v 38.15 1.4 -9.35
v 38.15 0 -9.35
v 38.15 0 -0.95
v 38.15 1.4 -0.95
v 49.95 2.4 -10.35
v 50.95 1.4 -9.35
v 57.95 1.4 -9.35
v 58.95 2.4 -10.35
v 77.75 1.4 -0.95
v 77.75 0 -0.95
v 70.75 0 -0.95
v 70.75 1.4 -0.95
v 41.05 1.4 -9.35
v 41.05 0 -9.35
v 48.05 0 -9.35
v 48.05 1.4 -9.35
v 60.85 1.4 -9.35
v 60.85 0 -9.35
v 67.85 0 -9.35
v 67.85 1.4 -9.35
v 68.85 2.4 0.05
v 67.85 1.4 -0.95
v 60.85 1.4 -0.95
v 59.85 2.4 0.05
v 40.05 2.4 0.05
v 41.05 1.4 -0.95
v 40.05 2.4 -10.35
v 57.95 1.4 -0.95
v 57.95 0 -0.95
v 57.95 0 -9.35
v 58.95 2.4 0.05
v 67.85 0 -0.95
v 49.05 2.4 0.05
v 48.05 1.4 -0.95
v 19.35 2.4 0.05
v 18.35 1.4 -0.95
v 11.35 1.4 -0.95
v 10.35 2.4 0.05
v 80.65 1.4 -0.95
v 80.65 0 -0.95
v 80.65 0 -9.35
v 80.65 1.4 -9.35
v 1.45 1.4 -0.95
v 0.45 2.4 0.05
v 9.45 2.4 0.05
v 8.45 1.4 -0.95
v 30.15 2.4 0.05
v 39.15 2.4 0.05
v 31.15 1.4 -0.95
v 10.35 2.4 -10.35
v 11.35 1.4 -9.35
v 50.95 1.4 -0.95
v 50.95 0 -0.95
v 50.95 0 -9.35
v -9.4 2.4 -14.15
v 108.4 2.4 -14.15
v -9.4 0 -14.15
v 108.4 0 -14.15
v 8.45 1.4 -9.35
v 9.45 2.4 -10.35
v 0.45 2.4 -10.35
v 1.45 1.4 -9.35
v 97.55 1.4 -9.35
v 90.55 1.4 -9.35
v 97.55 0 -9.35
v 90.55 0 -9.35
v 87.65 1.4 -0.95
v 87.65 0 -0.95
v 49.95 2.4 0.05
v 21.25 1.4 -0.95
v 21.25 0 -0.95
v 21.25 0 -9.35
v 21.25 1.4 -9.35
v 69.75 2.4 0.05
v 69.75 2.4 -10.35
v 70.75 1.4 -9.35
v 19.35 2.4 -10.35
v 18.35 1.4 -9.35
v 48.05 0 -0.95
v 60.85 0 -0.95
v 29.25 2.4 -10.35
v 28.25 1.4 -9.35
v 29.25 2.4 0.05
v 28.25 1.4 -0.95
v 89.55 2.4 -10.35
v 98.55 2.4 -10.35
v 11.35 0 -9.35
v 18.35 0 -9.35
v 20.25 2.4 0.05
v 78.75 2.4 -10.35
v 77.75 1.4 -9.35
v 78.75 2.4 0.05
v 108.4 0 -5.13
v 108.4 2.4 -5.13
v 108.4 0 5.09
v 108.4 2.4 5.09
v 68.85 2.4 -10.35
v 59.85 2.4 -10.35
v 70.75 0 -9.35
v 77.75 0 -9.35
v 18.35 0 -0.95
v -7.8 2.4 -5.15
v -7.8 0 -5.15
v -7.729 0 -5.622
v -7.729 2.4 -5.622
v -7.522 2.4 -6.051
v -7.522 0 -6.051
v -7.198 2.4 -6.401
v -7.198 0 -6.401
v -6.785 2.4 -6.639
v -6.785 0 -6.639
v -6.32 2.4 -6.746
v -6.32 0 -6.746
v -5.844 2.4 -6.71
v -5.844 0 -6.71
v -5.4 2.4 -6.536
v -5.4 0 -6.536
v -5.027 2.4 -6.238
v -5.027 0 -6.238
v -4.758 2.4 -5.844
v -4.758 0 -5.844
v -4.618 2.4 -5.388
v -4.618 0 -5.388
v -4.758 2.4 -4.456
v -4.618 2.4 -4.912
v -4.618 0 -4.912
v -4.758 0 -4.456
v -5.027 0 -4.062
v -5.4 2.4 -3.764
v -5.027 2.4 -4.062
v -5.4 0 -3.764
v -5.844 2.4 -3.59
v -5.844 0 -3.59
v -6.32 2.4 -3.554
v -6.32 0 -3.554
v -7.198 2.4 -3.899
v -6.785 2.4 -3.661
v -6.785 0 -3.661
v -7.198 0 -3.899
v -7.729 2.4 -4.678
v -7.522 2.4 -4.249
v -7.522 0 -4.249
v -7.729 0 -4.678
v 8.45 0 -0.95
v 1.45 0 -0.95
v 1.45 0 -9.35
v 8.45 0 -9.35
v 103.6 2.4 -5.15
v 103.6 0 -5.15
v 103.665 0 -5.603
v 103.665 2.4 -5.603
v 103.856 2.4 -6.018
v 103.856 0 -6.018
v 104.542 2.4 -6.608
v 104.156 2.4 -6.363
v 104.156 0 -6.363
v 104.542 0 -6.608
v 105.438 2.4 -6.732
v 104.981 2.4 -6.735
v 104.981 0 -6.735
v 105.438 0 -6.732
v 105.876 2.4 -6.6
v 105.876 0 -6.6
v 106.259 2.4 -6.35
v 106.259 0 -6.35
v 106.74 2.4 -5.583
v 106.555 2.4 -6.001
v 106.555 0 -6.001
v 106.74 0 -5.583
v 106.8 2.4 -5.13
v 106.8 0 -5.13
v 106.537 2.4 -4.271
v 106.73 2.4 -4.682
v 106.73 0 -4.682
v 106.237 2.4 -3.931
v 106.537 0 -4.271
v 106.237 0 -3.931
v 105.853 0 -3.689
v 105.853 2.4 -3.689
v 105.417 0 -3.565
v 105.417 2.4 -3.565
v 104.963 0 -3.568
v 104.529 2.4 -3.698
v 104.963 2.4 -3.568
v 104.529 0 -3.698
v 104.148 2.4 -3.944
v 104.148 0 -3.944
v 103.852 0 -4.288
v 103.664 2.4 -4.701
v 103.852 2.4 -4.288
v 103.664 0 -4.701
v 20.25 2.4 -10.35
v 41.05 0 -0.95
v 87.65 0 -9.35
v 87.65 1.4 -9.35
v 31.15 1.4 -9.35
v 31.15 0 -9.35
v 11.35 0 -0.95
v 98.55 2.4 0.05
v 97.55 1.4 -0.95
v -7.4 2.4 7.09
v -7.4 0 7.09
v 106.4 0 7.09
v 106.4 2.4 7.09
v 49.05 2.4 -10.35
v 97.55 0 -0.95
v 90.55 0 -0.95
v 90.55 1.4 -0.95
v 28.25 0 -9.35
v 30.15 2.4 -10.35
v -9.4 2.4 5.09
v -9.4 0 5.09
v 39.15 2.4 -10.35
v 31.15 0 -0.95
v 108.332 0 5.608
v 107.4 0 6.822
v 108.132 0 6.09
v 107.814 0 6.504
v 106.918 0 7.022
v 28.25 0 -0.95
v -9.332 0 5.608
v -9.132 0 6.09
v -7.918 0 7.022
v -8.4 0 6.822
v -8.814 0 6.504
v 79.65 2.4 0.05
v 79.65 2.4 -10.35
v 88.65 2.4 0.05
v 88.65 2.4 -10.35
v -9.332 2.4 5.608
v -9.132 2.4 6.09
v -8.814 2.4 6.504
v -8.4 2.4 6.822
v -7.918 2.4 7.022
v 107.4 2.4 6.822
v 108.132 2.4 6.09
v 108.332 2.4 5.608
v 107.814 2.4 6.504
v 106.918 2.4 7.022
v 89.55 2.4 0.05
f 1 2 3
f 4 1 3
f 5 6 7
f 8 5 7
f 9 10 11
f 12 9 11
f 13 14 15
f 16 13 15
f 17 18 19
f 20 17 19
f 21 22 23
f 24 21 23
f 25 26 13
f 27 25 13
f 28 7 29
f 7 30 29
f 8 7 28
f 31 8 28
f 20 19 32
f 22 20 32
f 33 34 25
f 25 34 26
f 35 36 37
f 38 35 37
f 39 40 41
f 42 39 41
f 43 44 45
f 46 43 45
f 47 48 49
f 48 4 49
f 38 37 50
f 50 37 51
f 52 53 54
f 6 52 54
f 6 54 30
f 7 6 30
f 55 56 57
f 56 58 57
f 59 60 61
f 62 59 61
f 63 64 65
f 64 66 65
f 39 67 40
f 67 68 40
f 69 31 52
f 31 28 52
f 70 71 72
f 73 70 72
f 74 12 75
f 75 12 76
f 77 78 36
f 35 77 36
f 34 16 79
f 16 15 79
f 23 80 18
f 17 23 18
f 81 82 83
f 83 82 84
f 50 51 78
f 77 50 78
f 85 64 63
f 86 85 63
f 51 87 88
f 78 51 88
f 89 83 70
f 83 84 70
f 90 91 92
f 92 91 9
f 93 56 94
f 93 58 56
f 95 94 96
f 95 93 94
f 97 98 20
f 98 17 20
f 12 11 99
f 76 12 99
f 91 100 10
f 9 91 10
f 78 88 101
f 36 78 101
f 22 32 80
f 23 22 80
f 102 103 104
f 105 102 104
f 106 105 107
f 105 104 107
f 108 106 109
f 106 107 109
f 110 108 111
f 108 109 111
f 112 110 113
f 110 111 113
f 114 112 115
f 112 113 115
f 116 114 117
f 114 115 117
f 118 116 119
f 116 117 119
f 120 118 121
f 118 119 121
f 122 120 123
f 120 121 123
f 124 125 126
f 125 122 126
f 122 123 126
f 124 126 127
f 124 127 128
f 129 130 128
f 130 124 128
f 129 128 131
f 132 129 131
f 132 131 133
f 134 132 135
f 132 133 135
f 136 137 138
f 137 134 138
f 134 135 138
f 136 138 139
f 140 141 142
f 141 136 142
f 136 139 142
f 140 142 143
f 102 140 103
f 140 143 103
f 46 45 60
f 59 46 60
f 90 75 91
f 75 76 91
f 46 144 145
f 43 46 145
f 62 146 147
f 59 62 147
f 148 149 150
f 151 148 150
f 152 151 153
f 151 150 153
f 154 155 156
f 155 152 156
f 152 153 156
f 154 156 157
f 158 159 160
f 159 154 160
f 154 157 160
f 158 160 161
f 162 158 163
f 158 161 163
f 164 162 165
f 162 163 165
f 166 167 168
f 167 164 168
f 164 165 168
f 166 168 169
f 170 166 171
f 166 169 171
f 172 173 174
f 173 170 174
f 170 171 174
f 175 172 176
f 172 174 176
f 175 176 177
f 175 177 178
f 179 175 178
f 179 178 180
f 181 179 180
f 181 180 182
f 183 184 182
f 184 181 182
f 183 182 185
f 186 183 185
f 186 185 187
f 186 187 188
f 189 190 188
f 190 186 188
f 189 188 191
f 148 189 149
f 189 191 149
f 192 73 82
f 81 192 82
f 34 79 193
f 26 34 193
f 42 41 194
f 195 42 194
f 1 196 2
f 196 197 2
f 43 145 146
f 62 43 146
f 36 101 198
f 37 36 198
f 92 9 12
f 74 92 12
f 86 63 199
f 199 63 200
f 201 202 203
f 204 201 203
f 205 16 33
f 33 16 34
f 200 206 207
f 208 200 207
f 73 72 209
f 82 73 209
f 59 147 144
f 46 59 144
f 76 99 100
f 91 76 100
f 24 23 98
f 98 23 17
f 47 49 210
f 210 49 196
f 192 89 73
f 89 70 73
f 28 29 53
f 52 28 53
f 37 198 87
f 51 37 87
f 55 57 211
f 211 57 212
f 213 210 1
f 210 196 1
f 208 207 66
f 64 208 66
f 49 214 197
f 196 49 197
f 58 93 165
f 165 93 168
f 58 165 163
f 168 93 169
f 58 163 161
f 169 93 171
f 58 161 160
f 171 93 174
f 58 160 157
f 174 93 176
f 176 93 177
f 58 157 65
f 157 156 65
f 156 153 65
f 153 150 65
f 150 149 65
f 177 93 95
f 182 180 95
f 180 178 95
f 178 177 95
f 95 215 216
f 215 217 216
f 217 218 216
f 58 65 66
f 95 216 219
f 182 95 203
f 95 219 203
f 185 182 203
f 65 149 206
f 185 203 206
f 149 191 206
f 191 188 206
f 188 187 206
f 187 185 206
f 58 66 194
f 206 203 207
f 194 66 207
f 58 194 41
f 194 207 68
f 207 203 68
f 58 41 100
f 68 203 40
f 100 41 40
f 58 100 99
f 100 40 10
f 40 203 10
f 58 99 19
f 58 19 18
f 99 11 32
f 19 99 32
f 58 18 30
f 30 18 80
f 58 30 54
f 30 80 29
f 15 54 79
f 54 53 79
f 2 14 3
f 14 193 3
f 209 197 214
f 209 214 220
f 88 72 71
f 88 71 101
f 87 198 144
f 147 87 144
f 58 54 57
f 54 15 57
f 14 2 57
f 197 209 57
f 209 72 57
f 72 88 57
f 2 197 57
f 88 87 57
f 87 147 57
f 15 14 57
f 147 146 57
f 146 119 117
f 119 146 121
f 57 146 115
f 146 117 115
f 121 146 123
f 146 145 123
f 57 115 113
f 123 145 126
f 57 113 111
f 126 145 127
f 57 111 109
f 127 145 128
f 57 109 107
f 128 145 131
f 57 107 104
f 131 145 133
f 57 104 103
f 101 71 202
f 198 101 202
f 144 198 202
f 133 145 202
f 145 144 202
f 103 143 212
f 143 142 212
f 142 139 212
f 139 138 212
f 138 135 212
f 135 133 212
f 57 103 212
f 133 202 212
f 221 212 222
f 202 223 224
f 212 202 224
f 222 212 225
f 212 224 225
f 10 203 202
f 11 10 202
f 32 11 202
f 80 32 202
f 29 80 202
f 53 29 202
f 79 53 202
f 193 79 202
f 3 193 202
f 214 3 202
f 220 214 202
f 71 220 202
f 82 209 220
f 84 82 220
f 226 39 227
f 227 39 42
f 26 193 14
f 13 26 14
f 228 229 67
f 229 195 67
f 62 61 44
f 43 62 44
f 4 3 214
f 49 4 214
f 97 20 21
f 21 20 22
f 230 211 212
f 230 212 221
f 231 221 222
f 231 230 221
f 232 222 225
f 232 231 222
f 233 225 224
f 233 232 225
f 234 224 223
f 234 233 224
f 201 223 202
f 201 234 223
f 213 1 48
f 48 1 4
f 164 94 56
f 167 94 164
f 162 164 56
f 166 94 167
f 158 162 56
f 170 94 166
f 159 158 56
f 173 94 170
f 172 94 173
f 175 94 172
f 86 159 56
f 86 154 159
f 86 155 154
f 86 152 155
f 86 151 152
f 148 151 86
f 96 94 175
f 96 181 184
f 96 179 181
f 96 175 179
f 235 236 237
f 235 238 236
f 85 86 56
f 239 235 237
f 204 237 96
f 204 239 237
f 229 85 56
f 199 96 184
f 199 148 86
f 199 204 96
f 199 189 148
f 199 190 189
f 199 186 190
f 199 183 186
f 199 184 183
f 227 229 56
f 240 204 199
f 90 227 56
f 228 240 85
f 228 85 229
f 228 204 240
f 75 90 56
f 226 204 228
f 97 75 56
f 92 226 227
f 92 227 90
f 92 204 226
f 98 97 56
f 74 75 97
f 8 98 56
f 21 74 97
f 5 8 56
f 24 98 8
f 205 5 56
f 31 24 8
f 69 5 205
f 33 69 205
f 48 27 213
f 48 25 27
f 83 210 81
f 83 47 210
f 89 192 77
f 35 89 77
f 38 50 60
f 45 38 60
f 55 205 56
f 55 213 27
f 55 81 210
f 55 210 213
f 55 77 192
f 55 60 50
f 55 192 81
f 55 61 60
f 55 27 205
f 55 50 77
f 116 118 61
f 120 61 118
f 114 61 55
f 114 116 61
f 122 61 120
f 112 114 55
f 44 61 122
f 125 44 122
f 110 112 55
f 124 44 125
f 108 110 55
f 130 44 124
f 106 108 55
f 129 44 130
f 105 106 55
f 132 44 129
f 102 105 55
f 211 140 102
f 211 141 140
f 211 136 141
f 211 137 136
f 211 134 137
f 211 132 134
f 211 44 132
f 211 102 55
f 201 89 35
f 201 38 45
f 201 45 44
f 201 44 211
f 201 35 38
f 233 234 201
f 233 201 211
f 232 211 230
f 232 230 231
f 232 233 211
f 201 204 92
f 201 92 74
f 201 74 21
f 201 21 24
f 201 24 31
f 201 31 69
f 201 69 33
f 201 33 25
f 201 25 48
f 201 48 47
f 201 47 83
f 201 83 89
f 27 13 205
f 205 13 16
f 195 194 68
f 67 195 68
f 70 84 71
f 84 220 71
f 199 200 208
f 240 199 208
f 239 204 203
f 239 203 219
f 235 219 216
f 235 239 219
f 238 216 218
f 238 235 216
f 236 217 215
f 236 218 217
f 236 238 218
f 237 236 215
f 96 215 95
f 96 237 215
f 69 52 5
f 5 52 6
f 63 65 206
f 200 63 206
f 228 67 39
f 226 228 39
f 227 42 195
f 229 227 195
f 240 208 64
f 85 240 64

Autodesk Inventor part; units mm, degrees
ref_plane "YZ Plane" through (0, 0, 0) normal (1, 0, 0) x (0, 1, 0)
ref_plane "XZ Plane" through (0, 0, 0) normal (0, 1, 0) x (-1, 0, 0)
ref_plane "XY Plane" through (0, 0, 0) normal (0, 0, 1) x (1, 0, 0)
sketch "Sketch1" plane through (0, 0, 0) normal (0, 1, 0) x (-1, 0, 0)
  line L0 (0, 0) -> (-9.9, 0)
  line L1 (0, 0) -> (0, -10.3)
  line L2 (0, -10.3) -> (-9.9, -10.3)
  line L3 (-9.9, -10.3) -> (-9.9, 0)
  line L4 (-9.9, -10.3) -> (-9.4, -10.3)
  line L5 (-9.4, -10.3) -> (-9.4, 0)
  line L6 (0, -10.3) -> (-0.5, -10.3)
  line L7 (-0.5, -10.3) -> (-0.5, 0)
  line L8 (-0.5, 0.85) -> (-9.9, 0.85)
  line L9 (-9.9, 0.85) -> (-9.9, 0)
  line L10 (0, 0) -> (0, 0.85)
  line L11 (0, 0.85) -> (-0.5, 0.85)
  line L12 (0, -10.3) -> (0, -11.15)
  line L13 (0, -11.15) -> (-9.9, -11.15)
  line L14 (-9.9, -11.15) -> (-9.9, -10.3)
  line L15 (-9.9, -11.15) -> (-19.8, -11.15)
  line L16 (-19.8, -11.15) -> (-19.8, -10.3)
  line L17 (-19.8, -10.3) -> (-19.8, 0)
  line L18 (-19.3, -10.3) -> (-19.3, 0)
  line L19 (-9.9, -10.3) -> (-19.8, -10.3)
  line L20 (-10.4, -10.3) -> (-10.4, 0)
  line L21 (-9.9, 0) -> (-9.9, -10.3)
  line L22 (-9.9, 0) -> (-9.9, 0.85)
  line L23 (-9.9, 0.85) -> (-10.4, 0.85)
  line L24 (-10.4, 0.85) -> (-19.8, 0.85)
  line L25 (-9.9, 0) -> (-19.8, 0)
  line L26 (-19.8, 0.85) -> (-19.8, 0)
  line L27 (-19.8, -11.15) -> (-29.7, -11.15)
  line L28 (-29.7, -11.15) -> (-29.7, -10.3)
  line L29 (-29.7, -10.3) -> (-29.7, 0)
  line L30 (-29.2, -10.3) -> (-29.2, 0)
  line L31 (-19.8, -10.3) -> (-29.7, -10.3)
  line L32 (-20.3, -10.3) -> (-20.3, 0)
  line L33 (-19.8, 0) -> (-19.8, -10.3)
  line L34 (-19.8, 0) -> (-19.8, 0.85)
  line L35 (-19.8, 0.85) -> (-20.3, 0.85)
  line L36 (-20.3, 0.85) -> (-29.7, 0.85)
  line L37 (-19.8, 0) -> (-29.7, 0)
  line L38 (-29.7, 0.85) -> (-29.7, 0)
  line L39 (-29.7, -11.15) -> (-39.6, -11.15)
  line L40 (-39.6, -11.15) -> (-39.6, -10.3)
  line L41 (-39.6, -10.3) -> (-39.6, 0)
  line L42 (-39.1, -10.3) -> (-39.1, 0)
  line L43 (-29.7, -10.3) -> (-39.6, -10.3)
  line L44 (-30.2, -10.3) -> (-30.2, 0)
  line L45 (-29.7, 0) -> (-29.7, -10.3)
  line L46 (-29.7, 0) -> (-29.7, 0.85)
  line L47 (-29.7, 0.85) -> (-30.2, 0.85)
  line L48 (-30.2, 0.85) -> (-39.6, 0.85)
  line L49 (-29.7, 0) -> (-39.6, 0)
  line L50 (-39.6, 0.85) -> (-39.6, 0)
  line L51 (-39.6, -11.15) -> (-49.5, -11.15)
  line L52 (-49.5, -11.15) -> (-49.5, -10.3)
  line L53 (-49.5, -10.3) -> (-49.5, 0)
  line L54 (-49, -10.3) -> (-49, 0)
  line L55 (-39.6, -10.3) -> (-49.5, -10.3)
  line L56 (-40.1, -10.3) -> (-40.1, 0)
  line L57 (-39.6, 0) -> (-39.6, -10.3)
  line L58 (-39.6, 0) -> (-39.6, 0.85)
  line L59 (-39.6, 0.85) -> (-40.1, 0.85)
  line L60 (-40.1, 0.85) -> (-49.5, 0.85)
  line L61 (-39.6, 0) -> (-49.5, 0)
  line L62 (-49.5, 0.85) -> (-49.5, 0)
  line L63 (-49.5, -11.15) -> (-59.4, -11.15)
  line L64 (-59.4, -11.15) -> (-59.4, -10.3)
  line L65 (-59.4, -10.3) -> (-59.4, 0)
  line L66 (-58.9, -10.3) -> (-58.9, 0)
  line L67 (-49.5, -10.3) -> (-59.4, -10.3)
  line L68 (-50, -10.3) -> (-50, 0)
  line L69 (-49.5, 0) -> (-49.5, -10.3)
  line L70 (-49.5, 0) -> (-49.5, 0.85)
  line L71 (-49.5, 0.85) -> (-50, 0.85)
  line L72 (-50, 0.85) -> (-59.4, 0.85)
  line L73 (-49.5, 0) -> (-59.4, 0)
  line L74 (-59.4, 0.85) -> (-59.4, 0)
  line L75 (-59.4, -11.15) -> (-69.3, -11.15)
  line L76 (-69.3, -11.15) -> (-69.3, -10.3)
  line L77 (-69.3, -10.3) -> (-69.3, 0)
  line L78 (-68.8, -10.3) -> (-68.8, 0)
  line L79 (-59.4, -10.3) -> (-69.3, -10.3)
  line L80 (-59.9, -10.3) -> (-59.9, 0)
  line L81 (-59.4, 0) -> (-59.4, -10.3)
  line L82 (-59.4, 0) -> (-59.4, 0.85)
  line L83 (-59.4, 0.85) -> (-59.9, 0.85)
  line L84 (-59.9, 0.85) -> (-69.3, 0.85)
  line L85 (-59.4, 0) -> (-69.3, 0)
  line L86 (-69.3, 0.85) -> (-69.3, 0)
  line L87 (-69.3, -11.15) -> (-79.2, -11.15)
  line L88 (-79.2, -11.15) -> (-79.2, -10.3)
  line L89 (-79.2, -10.3) -> (-79.2, 0)
  line L90 (-78.7, -10.3) -> (-78.7, 0)
  line L91 (-69.3, -10.3) -> (-79.2, -10.3)
  line L92 (-69.8, -10.3) -> (-69.8, 0)
  line L93 (-69.3, 0) -> (-69.3, -10.3)
  line L94 (-69.3, 0) -> (-69.3, 0.85)
  line L95 (-69.3, 0.85) -> (-69.8, 0.85)
  line L96 (-69.8, 0.85) -> (-79.2, 0.85)
  line L97 (-69.3, 0) -> (-79.2, 0)
  line L98 (-79.2, 0.85) -> (-79.2, 0)
  line L99 (-79.2, -11.15) -> (-89.1, -11.15)
  line L100 (-89.1, -11.15) -> (-89.1, -10.3)
  line L101 (-89.1, -10.3) -> (-89.1, 0)
  line L102 (-88.6, -10.3) -> (-88.6, 0)
  line L103 (-79.2, -10.3) -> (-89.1, -10.3)
  line L104 (-79.7, -10.3) -> (-79.7, 0)
  line L105 (-79.2, 0) -> (-79.2, -10.3)
  line L106 (-79.2, 0) -> (-79.2, 0.85)
  line L107 (-79.2, 0.85) -> (-79.7, 0.85)
  line L108 (-79.7, 0.85) -> (-89.1, 0.85)
  line L109 (-79.2, 0) -> (-89.1, 0)
  line L110 (-89.1, 0.85) -> (-89.1, 0)
  line L111 (-89.1, -11.15) -> (-99, -11.15)
  line L112 (-99, -11.15) -> (-99, -10.3)
  line L113 (-99, -10.3) -> (-99, 0)
  line L114 (-98.5, -10.3) -> (-98.5, 0)
  line L115 (-89.1, -10.3) -> (-99, -10.3)
  line L116 (-89.6, -10.3) -> (-89.6, 0)
  line L117 (-89.1, 0) -> (-89.1, -10.3)
  line L118 (-89.1, 0) -> (-89.1, 0.85)
  line L119 (-89.1, 0.85) -> (-89.6, 0.85)
  line L120 (-89.6, 0.85) -> (-99, 0.85)
  line L121 (-89.1, 0) -> (-99, 0)
  line L122 (-99, 0.85) -> (-99, 0)
  line L123 (0, -11.15) -> (0, 0.85)
  line L124 (0, -11.15) -> (0, -14.15)
  line L125 (0, -14.15) -> (0, -14.15)
  line L126 (-99, 0.85) -> (-102, 0.85)
  line L127 (-102, 0.85) -> (-102, 3.85)
  line L128 (0, -14.15) -> (-102, -14.15)
  line L129 (-102, -14.15) -> (-102, 3.85)
  line L130 (0, 3.89) -> (0, -14.15)
  line L131 (0, -11.15) -> (0, -11.15)
  line L132 (0, 0.85) -> (0, 0.85)
  line L133 (0, -11.15) -> (-2, -11.15)
  line L134 (-2, -11.15) -> (-2, 0.85)
  line L135 (0, -14.15) -> (3.2, -14.15)
  line L136 (3.2, -14.15) -> (3.2, 3.89)
  line L137 (3.2, 3.89) -> (0, 3.89)
  line L138 (0, -11.15) -> (3.2, -11.15)
  line L139 (0, 0.85) -> (3.2, 0.85)
  line L140 (3.2, -14.15) -> (6.2, -14.15)
  line L141 (6.2, 3.89) -> (3.2, 3.89)
  line L142 (0, -14.15) -> (6.2, -14.15)
  line L143 (-49.5, 3.85) -> (-49.5, 0.85)
  line L144 (6.2, 3.89) -> (6.2, 7.09)
  line L145 (6.2, 7.09) -> (6.2, 13.49)
  line L146 (3.2, 3.89) -> (3.2, 13.45)
  line L147 (-102, 3.85) -> (-102, 13.45)
  line L148 (0, 3.89) -> (0, 13.49)
  line L149 (-49.5, 3.85) -> (-87.8335, 3.85)
  line L150 (-49.5, 3.85) -> (-11.1665, 3.89)
  line L151 (-11.1665, 3.89) -> (0, 3.89)
  line L152 (-87.8335, 3.85) -> (-102, 3.85)
  line L153 (-102, -14.15) -> (-105, -14.15)
  line L154 (-105, 13.49) -> (6.2, 13.49)
  line L155 (6.2, 7.09) -> (-105, 7.09)
  line L156 (-49.5, 3.85) -> (-49.5, 7.09)
  line L157 (-49.5, 7.09) -> (-49.5, 10.29)
  line L158 (-49.5, 10.29) -> (-11.1665, 10.29)
  line L159 (-49.5, 10.29) -> (-87.8335, 10.29)
  line L160 (-91.0335, 13.49) -> (-84.6335, 13.49)
  line L161 (-84.6335, 13.49) -> (-84.6335, 7.09)
  line L162 (-84.6335, 7.09) -> (-91.0335, 7.09)
  line L163 (-91.0335, 7.09) -> (-91.0335, 13.49)
  line L164 (-91.0335, 13.49) -> (-84.6335, 7.09) construction
  line L165 (-84.6335, 13.49) -> (-91.0335, 7.09) construction
  line L166 (-14.3665, 13.49) -> (-7.9665, 13.49)
  line L167 (-7.9665, 13.49) -> (-7.9665, 7.09)
  line L168 (-7.9665, 7.09) -> (-14.3665, 7.09)
  line L169 (-14.3665, 7.09) -> (-14.3665, 13.49)
  line L170 (-14.3665, 13.49) -> (-7.9665, 7.09) construction
  line L171 (-7.9665, 13.49) -> (-14.3665, 7.09) construction
  circle A0 centre (-11.1665, 10.29) radius 1.6
  circle A1 centre (-87.8335, 10.29) radius 1.6
  line L172 (6.2, -14.15) -> (9.4, -14.15)
  line L173 (9.4, -14.15) -> (9.4, 3.89)
  line L174 (9.4, 3.89) -> (6.2, 3.89)
  line L175 (9.4, 3.89) -> (9.4, 7.09)
  line L176 (9.4, 7.09) -> (6.2, 7.09)
  line L177 (-105, 7.09) -> (-108.2, 7.09)
  line L178 (-108.2, -14.15) -> (-105, -14.15)
  line L179 (-105, 13.49) -> (-105, 7.09)
  line L180 (-102, -14.15) -> (-108.4, -14.15)
  line L181 (-108.4, -14.15) -> (-108.4, 7.09)
  line L182 (-108.4, 7.09) -> (-108.2, 7.09)
  line L183 (-108.4, -5.13) -> (-105.2, -5.13)
  line L184 (3.2, -11.15) -> (3.2, 0.85)
  line L185 (3.2, -5.15) -> (9.4, -5.15)
  line L186 (3.2, -5.15) -> (9.4, -5.15) construction
  line L187 (9.4, -5.15) -> (6.2, -5.15)
  circle A2 centre (6.2, -5.15) radius 1.6
  circle A3 centre (-105.2, -5.15) radius 1.6
  line L188 (0, 0) -> (-9.9, 0)
  line L189 (-4.95, 0) -> (-4.95, -10.3)
  line L190 (-8.45, -0.95) -> (-1.45, -0.95)
  line L191 (-1.45, -0.95) -> (-1.45, -9.35)
  line L192 (-1.45, -9.35) -> (-8.45, -9.35)
  line L193 (-8.45, -9.35) -> (-8.45, -0.95)
  line L194 (-8.45, -0.95) -> (-1.45, -9.35) construction
  line L195 (-1.45, -0.95) -> (-8.45, -9.35) construction
  line L196 (-9.4, 0) -> (-0.5, 0)
  point P0 (-2, 0)
  point P1 (-2, -10.3)
  point P2 (0, 0.85)
  point P3 (0, 7.09)
  point P4 (3.2, 7.09)
  point P5 (-4.95, -5.15)
  dimension "d0" = 9.9
  dimension "d1" = 10.3
  dimension "d2" = 0.5
  dimension "d3" = 0.5
  dimension "d6" = 0.85
  dimension "d7" = 0.85
  dimension "d10" = 9.9
  dimension "d15" = 3
  dimension "d16" = 0
  dimension "d19" = 3
  dimension "d20" = 2
  dimension "d30" = 3.2
  dimension "d31" = 3
  dimension "d32" = 3
  dimension "d35" = 3.2
  dimension "d36" = 6.4
  dimension "d38" = 38.3335
  dimension "d45" = 3.2
  dimension "d47" = 38.3335
  dimension "d48" = 6.4
  dimension "d49" = 6.4
  dimension "d50" = 3.2
  dimension "d51" = 3.2
  dimension "d53" = 6.4
  dimension "d58" = 3.2
  dimension "d59" = 3.2
  dimension "d60" = 3.2
  dimension "d63" = 7
  dimension "d64" = 8.4
  dimension "d72" = 8.9
extrude "Extrusion6" add sketch "Sketch1" along normal blind 2.4 contours L1 L2 L7 L0 | L10 L139 L136 L138 L12 L1 | L0 L134 L8 L11 L10 | L7 L2 L134 L192 L191 L190 L0 | L12 L13 L134 L2 | L11 L8 L23 L24 L35 L36 L47 L48 L59 L60 L143 L150 L151 L130 | L130 L137 L136 L139 | L134 L190 L189 L0 | L0 L9 L8 L134 | L124 L128 L129 L126 L122 L113 L112 L111 L99 L87 L75 L63 L51 L39 L27 L15 L13 | L138 L136 L135 L124 | L148 L155 L146 L137 | L151 L150 L156 L155 L148 | L136 L141 L174 L173 L185 A2 | L189 L190 L193 L192 L2 L5 L0 | L190 L191 L192 L134 | L134 L192 L189 L190 | L134 L13 L14 L2 | L2 L189 L192 L134 | L136 L185 A2 L173 L172 L140 | L146 L155 L144 L141 | L5 L2 L3 L0 | L189 L192 L193 L190 | L9 L25 L26 L24 L23 | L15 L16 L19 L14 | L153 L178 L180 L181 L182 L177 L155 L147 L127 L129 | L144 L176 L175 L174 | L143 L71 L72 L83 L84 L95 L96 L107 L108 L119 L120 L126 L127 L152 L149 | L149 L152 L147 L155 L156 | L3 L19 L20 L25 | L27 L28 L31 L16 | L60 L59 L50 L61 L62 | L62 L73 L74 L72 L71 | L20 L19 L18 L25 | L26 L37 L38 L36 L35 | L31 L32 L37 L17 | L17 L25 L18 L19 | L39 L40 L43 L28 | L120 L119 L110 L121 L122 | L61 L54 L55 L53 | L53 L67 L68 L73 | L31 L30 L37 L32 | L43 L44 L49 L29 | L29 L37 L30 L31 | L51 L52 L55 L40 | L121 L114 L115 L113 | L48 L47 L38 L49 L50 | L52 L63 L64 L67 | L61 L56 L55 L54 | L68 L67 L66 L73 | L74 L85 L86 L84 L83 | L43 L42 L49 L44 | L55 L56 L61 L41 | L41 L49 L42 L43 | L108 L107 L98 L109 L110 | L115 L100 L111 L112 | L121 L116 L115 L114 | L66 L67 L65 L73 | L65 L79 L80 L85 | L75 L76 L79 L64 | L109 L102 L103 L101 | L101 L115 L116 L121 | L80 L79 L78 L85 | L86 L97 L98 L96 L95 | L87 L88 L91 L76 | L103 L88 L99 L100 | L109 L104 L103 L102 | L78 L79 L77 L85 | L77 L91 L92 L97 | L97 L90 L91 L89 | L89 L103 L104 L109 | L92 L91 L90 L97
extrude "Extrusion7" cut sketch "Sketch1" along normal through all contours L190 L191 L192 L134 | L134 L192 L189 L190 | L189 L192 L193 L190
chamfer "Chamfer2" distance 1 angle 45 4 edges at (4.95, 2.4, -9.35) (1.45, 2.4, -5.15) (8.45, 2.4, -5.15) (4.95, 2.4, -0.95)
pattern_linear "Rectangular Pattern2" count 10 spacing 9.9 along (1, 0, 0) of "Extrusion7", "Chamfer2"
fillet "Fillet1" radius 2 2 edges at (108.4, 1.2, 7.09) (-9.4, 1.2, 7.09)
properties part number "10x led strip holder top cover"
